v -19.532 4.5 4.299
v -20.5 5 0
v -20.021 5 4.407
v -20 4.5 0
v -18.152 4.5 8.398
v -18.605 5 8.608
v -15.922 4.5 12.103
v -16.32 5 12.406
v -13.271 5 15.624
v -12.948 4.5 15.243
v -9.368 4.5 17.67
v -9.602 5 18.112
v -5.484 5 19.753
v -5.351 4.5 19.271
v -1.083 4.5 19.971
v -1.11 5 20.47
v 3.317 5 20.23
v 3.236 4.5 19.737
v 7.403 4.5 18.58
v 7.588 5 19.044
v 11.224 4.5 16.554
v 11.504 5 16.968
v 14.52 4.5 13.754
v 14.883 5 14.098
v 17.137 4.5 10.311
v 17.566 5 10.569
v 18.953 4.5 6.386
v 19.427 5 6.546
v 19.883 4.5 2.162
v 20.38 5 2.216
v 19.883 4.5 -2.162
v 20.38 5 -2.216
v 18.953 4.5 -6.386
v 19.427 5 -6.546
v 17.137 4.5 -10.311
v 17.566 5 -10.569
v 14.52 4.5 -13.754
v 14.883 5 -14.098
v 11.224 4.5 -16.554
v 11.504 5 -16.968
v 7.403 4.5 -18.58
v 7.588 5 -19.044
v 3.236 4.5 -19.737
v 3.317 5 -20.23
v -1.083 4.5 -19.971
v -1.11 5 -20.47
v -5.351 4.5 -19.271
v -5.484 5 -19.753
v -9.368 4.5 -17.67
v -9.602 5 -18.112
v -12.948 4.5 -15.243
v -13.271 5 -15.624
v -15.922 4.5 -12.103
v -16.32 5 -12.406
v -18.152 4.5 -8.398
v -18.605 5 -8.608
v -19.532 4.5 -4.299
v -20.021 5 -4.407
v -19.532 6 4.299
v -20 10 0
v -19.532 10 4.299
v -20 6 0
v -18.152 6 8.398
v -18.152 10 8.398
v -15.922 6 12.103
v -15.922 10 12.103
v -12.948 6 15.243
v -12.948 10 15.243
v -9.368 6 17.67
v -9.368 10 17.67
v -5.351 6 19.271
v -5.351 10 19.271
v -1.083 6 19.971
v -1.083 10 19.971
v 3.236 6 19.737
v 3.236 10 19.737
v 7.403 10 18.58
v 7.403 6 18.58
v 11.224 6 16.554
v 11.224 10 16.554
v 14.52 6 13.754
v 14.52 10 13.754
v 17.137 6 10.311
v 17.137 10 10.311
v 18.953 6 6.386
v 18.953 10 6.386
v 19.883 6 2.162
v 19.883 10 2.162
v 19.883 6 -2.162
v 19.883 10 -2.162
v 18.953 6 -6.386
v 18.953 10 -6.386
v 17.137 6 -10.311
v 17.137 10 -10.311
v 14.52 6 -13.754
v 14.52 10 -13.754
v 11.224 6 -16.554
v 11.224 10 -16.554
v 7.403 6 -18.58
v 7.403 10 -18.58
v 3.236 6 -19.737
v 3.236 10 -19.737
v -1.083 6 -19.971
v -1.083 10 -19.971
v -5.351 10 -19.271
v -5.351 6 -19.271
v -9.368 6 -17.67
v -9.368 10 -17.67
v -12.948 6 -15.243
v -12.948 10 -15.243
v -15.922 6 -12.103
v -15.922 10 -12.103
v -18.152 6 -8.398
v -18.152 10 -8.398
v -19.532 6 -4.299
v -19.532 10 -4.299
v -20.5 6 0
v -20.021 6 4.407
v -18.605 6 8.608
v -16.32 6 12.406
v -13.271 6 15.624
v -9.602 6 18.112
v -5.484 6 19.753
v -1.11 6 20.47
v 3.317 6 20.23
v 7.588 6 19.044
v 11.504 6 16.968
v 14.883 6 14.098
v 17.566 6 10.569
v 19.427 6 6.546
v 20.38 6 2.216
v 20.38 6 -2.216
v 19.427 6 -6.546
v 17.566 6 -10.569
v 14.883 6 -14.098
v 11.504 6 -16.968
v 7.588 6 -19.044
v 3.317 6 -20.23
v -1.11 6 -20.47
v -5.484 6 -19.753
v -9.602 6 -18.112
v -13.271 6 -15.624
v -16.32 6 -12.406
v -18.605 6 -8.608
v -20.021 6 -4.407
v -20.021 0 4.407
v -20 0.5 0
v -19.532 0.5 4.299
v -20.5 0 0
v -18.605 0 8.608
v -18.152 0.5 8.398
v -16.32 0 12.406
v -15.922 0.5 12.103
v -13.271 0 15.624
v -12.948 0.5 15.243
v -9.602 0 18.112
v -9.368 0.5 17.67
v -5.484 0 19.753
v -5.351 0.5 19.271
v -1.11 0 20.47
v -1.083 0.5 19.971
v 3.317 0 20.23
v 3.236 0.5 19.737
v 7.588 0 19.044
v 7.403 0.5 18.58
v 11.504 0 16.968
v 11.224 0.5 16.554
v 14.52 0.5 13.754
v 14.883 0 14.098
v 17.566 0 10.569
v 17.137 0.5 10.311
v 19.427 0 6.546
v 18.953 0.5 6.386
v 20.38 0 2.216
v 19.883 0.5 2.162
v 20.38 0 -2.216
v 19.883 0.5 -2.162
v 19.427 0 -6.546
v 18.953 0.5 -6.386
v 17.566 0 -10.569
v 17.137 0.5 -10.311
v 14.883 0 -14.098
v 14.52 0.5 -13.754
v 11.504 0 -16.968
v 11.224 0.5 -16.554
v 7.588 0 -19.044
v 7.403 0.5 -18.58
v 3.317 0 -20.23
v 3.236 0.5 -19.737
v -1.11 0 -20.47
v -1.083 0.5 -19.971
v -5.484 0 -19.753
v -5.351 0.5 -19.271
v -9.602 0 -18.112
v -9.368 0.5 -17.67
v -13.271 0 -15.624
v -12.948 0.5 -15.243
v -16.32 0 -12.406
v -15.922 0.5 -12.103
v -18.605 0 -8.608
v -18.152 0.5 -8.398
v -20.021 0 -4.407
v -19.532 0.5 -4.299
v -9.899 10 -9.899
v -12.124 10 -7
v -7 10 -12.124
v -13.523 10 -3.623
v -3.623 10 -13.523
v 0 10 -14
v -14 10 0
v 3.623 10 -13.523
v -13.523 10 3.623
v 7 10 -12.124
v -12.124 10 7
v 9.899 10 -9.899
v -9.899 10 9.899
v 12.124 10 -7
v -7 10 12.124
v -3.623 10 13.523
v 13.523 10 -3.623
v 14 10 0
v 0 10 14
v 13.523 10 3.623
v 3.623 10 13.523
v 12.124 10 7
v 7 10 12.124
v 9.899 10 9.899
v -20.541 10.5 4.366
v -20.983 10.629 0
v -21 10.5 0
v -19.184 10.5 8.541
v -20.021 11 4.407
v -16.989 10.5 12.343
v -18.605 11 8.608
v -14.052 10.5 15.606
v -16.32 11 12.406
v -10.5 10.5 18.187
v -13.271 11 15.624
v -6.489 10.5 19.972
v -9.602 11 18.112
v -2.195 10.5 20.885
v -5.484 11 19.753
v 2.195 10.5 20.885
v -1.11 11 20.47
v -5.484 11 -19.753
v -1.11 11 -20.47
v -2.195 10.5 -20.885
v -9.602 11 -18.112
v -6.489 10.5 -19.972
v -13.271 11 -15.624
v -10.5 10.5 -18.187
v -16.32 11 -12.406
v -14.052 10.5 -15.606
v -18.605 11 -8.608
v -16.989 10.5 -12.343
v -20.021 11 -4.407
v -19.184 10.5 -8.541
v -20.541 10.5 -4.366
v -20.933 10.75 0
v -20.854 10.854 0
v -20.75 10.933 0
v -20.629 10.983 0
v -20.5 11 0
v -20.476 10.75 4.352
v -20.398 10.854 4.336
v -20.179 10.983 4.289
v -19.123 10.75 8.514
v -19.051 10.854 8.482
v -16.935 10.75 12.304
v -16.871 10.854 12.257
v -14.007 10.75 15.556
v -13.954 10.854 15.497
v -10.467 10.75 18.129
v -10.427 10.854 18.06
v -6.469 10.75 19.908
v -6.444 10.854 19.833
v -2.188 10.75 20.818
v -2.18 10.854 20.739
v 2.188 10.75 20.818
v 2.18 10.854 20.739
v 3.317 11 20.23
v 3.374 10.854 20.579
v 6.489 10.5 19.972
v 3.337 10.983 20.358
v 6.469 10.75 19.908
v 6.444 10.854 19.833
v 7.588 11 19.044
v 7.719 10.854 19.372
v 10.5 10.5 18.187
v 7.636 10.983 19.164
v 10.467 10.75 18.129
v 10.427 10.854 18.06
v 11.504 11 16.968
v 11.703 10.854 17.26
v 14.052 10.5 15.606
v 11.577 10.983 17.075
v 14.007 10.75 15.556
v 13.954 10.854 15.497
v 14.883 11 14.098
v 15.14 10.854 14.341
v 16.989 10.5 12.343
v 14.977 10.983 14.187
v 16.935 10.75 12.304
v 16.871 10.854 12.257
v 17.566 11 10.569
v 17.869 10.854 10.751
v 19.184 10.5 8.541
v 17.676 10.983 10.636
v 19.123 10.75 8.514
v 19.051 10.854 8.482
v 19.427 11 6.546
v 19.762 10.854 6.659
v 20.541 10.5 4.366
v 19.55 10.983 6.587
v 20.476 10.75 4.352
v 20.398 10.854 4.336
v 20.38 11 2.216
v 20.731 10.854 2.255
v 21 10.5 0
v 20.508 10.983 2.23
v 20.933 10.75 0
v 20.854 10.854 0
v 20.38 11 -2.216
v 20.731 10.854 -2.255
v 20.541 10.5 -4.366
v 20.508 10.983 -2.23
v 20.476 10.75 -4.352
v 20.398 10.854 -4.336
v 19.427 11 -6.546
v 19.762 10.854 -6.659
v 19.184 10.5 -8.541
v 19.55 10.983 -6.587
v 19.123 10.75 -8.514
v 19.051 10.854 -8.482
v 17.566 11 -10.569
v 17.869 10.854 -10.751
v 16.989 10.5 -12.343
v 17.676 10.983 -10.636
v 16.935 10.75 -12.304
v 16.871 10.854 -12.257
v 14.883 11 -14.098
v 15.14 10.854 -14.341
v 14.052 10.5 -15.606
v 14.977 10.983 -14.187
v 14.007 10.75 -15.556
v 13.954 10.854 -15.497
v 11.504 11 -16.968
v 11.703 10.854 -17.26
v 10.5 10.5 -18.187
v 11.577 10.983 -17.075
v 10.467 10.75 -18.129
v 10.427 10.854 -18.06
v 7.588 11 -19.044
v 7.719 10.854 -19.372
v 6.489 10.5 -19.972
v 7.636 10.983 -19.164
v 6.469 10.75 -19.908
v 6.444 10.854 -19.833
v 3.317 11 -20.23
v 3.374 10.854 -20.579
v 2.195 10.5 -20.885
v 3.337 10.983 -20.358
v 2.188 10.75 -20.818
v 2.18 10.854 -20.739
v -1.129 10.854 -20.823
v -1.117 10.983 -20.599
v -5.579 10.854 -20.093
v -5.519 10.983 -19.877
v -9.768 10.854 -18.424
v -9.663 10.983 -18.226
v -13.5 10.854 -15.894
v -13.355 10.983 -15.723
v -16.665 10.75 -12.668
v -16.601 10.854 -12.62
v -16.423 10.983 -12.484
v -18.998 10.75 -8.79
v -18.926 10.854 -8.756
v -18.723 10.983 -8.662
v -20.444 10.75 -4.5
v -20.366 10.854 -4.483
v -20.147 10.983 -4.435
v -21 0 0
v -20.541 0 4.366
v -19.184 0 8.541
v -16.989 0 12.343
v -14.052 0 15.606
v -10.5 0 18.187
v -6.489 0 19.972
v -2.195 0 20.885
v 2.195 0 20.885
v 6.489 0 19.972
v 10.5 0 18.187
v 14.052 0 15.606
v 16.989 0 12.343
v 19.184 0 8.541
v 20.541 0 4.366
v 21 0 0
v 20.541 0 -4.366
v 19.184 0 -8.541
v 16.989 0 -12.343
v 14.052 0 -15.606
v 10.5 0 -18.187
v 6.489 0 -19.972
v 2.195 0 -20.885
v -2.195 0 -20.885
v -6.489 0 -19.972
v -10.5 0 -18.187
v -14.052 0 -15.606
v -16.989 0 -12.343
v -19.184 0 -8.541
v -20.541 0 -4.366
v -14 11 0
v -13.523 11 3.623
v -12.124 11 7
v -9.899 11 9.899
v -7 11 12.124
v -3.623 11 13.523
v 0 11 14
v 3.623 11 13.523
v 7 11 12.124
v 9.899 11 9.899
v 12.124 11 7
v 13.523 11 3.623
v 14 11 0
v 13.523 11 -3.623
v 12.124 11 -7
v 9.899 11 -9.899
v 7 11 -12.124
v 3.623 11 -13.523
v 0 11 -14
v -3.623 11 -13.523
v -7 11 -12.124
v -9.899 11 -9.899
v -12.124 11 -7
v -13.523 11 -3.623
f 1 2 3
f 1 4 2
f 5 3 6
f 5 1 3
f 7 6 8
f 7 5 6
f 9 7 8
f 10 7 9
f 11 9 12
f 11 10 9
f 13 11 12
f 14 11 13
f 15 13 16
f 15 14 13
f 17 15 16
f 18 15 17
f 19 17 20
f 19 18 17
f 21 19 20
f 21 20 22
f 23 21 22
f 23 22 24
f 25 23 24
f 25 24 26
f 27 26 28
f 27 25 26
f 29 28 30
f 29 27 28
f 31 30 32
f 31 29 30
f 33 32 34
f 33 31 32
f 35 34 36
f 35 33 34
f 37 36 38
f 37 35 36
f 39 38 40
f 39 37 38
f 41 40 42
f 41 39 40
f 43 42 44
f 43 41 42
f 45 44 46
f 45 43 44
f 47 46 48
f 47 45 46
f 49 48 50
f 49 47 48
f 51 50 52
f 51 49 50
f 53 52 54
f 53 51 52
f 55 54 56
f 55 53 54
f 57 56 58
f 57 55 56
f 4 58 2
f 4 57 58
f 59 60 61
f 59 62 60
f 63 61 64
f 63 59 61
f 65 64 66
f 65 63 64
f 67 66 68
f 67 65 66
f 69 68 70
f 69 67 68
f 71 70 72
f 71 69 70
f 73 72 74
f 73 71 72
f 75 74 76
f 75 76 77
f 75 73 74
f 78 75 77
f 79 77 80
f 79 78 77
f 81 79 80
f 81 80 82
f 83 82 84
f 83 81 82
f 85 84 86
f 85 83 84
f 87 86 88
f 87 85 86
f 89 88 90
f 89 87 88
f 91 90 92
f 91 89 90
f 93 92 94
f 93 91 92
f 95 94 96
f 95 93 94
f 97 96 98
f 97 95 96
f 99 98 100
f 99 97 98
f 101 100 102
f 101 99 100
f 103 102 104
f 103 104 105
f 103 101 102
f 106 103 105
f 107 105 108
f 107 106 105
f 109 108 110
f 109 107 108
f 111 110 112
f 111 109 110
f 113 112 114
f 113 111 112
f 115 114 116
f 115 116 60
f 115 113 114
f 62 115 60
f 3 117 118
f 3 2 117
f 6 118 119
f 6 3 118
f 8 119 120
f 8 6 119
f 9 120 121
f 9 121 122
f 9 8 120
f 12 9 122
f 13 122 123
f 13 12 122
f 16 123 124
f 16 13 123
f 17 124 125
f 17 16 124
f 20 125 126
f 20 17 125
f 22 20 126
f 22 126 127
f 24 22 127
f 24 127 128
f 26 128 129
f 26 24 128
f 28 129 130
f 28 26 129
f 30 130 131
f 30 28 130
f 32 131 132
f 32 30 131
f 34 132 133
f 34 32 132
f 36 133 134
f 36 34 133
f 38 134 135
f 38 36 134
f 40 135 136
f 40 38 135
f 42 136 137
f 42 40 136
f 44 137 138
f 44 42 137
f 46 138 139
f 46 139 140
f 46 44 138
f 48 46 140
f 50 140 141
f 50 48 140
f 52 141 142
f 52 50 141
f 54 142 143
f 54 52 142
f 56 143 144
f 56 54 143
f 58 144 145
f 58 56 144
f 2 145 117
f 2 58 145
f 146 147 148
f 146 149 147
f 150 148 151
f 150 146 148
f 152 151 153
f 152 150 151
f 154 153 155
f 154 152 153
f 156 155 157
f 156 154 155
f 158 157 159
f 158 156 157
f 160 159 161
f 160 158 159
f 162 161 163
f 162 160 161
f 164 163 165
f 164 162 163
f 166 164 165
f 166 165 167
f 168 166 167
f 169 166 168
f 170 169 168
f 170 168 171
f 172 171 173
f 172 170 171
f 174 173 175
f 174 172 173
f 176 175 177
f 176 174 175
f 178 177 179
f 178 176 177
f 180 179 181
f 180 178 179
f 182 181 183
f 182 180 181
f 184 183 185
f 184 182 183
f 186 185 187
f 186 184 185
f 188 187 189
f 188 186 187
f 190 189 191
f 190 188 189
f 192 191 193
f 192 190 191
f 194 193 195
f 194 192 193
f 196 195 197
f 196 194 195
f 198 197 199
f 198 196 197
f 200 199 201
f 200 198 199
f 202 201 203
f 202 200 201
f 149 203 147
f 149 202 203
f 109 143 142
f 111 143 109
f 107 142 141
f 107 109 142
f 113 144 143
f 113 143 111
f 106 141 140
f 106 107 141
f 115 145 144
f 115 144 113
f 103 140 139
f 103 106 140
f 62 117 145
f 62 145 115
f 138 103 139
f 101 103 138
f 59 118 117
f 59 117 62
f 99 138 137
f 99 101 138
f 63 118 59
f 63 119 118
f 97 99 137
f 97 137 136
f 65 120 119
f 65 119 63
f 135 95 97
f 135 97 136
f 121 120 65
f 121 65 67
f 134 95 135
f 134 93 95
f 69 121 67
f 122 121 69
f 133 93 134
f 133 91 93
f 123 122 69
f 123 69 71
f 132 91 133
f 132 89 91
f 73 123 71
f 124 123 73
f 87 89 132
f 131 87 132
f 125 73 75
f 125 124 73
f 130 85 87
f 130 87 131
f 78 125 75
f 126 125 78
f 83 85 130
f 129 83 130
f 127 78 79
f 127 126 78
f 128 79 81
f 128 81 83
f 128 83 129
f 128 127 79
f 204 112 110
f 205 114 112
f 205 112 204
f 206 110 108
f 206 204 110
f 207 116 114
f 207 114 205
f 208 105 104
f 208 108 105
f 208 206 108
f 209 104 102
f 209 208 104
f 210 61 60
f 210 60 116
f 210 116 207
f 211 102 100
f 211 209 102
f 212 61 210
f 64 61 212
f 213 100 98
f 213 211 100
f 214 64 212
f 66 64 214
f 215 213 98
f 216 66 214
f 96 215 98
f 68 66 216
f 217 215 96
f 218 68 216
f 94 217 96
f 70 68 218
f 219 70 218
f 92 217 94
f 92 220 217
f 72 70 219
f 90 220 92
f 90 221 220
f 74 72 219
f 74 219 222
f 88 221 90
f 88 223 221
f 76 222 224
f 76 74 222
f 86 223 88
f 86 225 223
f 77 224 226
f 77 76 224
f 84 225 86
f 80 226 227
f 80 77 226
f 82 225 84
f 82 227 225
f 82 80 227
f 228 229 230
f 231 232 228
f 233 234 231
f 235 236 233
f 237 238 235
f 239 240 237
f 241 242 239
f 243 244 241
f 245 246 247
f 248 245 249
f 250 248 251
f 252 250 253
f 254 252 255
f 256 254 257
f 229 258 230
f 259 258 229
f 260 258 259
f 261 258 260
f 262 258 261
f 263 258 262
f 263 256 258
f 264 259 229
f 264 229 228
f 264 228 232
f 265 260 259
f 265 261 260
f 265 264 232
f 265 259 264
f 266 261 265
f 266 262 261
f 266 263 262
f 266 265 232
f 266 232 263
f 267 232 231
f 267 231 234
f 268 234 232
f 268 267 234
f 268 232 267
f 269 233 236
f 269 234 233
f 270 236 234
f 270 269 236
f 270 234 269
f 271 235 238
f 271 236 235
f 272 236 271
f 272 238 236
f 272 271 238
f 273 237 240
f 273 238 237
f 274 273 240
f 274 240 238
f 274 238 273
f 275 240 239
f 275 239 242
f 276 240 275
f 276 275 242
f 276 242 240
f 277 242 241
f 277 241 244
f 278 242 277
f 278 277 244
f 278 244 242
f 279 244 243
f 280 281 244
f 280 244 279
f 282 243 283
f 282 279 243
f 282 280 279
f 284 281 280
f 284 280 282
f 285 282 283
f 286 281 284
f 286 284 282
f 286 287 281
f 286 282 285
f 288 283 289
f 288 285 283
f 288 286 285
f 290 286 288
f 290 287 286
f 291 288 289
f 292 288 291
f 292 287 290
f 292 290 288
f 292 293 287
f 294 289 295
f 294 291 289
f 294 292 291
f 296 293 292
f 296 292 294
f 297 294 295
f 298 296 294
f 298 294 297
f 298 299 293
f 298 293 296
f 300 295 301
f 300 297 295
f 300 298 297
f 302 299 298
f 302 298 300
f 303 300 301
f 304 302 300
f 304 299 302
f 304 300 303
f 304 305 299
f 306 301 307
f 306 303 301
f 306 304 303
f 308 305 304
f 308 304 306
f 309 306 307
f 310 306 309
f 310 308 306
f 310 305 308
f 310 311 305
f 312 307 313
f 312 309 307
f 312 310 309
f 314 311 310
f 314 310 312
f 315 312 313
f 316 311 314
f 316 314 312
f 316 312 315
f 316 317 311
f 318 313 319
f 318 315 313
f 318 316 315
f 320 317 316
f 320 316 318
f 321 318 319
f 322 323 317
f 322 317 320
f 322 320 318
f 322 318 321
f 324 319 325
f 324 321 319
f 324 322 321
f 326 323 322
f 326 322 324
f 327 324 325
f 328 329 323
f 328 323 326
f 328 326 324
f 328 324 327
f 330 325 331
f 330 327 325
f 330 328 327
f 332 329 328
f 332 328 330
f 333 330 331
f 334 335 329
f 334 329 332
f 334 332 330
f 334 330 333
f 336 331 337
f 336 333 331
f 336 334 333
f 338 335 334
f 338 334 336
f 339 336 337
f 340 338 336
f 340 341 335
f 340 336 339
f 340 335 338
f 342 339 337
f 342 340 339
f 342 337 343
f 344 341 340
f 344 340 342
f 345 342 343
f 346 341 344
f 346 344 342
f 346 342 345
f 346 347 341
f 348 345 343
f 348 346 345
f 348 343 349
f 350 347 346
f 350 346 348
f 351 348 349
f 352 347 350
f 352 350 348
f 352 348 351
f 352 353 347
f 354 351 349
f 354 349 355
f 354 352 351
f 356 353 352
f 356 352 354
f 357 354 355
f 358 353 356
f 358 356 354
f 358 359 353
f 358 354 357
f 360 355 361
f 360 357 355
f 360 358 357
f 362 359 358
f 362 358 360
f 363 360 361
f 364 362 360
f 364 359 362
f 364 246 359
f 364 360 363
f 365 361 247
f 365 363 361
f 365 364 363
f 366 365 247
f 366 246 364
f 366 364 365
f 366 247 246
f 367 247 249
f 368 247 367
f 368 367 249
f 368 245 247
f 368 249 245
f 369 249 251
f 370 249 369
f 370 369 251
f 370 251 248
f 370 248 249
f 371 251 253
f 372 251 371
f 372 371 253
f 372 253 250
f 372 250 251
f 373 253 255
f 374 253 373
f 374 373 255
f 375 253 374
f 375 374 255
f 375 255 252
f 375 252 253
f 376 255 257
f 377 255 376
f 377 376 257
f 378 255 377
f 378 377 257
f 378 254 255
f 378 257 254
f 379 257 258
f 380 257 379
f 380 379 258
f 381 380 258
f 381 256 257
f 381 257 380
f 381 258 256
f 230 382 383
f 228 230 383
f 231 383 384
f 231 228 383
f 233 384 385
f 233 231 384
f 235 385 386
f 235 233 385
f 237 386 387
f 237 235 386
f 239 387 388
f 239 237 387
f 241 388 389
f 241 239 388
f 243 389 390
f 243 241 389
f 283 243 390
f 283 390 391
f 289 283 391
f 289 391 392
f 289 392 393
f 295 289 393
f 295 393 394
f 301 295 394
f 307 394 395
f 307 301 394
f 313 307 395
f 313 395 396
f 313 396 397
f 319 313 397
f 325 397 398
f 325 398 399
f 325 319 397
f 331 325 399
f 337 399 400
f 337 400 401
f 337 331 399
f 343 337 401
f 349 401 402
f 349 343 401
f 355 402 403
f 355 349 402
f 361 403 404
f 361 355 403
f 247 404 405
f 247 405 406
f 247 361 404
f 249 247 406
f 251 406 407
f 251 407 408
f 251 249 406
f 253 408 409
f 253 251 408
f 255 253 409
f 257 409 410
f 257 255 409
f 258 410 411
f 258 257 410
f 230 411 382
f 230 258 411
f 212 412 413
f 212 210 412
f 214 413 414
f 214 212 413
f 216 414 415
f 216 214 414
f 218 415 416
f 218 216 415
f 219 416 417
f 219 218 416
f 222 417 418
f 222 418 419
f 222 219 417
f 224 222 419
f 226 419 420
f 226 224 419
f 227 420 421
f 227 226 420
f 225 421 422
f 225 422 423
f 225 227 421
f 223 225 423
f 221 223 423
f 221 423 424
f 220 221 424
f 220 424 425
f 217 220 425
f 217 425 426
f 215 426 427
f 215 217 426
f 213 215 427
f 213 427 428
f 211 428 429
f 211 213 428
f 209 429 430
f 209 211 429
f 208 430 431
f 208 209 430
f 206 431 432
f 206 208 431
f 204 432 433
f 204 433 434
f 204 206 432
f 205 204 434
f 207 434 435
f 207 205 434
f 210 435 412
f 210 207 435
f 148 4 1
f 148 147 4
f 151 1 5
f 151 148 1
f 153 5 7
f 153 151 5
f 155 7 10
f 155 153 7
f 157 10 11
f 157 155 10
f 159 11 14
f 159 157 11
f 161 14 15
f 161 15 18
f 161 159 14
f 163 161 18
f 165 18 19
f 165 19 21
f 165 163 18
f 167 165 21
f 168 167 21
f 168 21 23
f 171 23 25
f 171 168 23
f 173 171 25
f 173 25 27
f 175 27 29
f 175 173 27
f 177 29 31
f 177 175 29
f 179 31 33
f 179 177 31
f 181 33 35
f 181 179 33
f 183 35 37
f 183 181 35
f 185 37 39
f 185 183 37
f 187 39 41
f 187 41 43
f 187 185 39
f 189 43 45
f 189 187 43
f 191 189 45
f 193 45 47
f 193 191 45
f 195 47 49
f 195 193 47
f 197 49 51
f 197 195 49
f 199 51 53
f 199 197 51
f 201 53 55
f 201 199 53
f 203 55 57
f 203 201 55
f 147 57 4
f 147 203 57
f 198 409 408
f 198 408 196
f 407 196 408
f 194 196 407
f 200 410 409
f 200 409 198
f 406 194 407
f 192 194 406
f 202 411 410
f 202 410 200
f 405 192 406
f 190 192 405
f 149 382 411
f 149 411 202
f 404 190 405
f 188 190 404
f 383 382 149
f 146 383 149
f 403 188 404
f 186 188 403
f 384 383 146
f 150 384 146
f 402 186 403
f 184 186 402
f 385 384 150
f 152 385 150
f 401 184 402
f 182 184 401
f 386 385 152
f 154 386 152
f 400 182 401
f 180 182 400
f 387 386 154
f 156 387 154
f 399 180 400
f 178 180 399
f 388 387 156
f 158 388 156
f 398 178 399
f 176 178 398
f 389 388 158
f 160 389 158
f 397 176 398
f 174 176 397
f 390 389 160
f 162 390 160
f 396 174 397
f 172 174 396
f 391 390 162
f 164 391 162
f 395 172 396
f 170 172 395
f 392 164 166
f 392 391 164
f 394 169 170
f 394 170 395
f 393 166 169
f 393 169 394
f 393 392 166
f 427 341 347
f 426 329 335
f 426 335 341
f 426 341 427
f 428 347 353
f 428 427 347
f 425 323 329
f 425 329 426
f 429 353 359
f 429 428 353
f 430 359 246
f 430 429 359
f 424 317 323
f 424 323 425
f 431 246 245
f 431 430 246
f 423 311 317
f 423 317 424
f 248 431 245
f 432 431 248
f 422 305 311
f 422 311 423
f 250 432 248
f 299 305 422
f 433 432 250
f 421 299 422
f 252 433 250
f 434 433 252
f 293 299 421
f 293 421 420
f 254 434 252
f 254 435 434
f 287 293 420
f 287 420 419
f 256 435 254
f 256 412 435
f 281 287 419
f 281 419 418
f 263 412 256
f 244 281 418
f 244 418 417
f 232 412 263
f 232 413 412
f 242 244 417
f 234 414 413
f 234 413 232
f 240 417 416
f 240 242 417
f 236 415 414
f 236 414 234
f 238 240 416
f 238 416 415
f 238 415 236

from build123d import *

# Parameters (mm, degrees)
FILETE1_R = 0.5


with BuildPart() as part:
    # Esboço1 → Revolução2 (revolve)
    with BuildSketch(Plane.XY):
        Polygon((-21, 0), (-21, 11), (-14, 11), (-14, 10), (-20, 10), (-20, 6), (-20.5, 6), (-20.5, 5), (-20, 4.5), (-20, 0.5), (-20.5, 0), align=None)
    revolve(axis=Axis((0, 0, 0), (0, 1, 0)))

    # Filete1
    filete1_edges = [part.edges().sort_by_distance(p)[0] for p in [
        (21, 11, 0),
    ]]
    fillet(filete1_edges, radius=FILETE1_R)


solid = part.part
